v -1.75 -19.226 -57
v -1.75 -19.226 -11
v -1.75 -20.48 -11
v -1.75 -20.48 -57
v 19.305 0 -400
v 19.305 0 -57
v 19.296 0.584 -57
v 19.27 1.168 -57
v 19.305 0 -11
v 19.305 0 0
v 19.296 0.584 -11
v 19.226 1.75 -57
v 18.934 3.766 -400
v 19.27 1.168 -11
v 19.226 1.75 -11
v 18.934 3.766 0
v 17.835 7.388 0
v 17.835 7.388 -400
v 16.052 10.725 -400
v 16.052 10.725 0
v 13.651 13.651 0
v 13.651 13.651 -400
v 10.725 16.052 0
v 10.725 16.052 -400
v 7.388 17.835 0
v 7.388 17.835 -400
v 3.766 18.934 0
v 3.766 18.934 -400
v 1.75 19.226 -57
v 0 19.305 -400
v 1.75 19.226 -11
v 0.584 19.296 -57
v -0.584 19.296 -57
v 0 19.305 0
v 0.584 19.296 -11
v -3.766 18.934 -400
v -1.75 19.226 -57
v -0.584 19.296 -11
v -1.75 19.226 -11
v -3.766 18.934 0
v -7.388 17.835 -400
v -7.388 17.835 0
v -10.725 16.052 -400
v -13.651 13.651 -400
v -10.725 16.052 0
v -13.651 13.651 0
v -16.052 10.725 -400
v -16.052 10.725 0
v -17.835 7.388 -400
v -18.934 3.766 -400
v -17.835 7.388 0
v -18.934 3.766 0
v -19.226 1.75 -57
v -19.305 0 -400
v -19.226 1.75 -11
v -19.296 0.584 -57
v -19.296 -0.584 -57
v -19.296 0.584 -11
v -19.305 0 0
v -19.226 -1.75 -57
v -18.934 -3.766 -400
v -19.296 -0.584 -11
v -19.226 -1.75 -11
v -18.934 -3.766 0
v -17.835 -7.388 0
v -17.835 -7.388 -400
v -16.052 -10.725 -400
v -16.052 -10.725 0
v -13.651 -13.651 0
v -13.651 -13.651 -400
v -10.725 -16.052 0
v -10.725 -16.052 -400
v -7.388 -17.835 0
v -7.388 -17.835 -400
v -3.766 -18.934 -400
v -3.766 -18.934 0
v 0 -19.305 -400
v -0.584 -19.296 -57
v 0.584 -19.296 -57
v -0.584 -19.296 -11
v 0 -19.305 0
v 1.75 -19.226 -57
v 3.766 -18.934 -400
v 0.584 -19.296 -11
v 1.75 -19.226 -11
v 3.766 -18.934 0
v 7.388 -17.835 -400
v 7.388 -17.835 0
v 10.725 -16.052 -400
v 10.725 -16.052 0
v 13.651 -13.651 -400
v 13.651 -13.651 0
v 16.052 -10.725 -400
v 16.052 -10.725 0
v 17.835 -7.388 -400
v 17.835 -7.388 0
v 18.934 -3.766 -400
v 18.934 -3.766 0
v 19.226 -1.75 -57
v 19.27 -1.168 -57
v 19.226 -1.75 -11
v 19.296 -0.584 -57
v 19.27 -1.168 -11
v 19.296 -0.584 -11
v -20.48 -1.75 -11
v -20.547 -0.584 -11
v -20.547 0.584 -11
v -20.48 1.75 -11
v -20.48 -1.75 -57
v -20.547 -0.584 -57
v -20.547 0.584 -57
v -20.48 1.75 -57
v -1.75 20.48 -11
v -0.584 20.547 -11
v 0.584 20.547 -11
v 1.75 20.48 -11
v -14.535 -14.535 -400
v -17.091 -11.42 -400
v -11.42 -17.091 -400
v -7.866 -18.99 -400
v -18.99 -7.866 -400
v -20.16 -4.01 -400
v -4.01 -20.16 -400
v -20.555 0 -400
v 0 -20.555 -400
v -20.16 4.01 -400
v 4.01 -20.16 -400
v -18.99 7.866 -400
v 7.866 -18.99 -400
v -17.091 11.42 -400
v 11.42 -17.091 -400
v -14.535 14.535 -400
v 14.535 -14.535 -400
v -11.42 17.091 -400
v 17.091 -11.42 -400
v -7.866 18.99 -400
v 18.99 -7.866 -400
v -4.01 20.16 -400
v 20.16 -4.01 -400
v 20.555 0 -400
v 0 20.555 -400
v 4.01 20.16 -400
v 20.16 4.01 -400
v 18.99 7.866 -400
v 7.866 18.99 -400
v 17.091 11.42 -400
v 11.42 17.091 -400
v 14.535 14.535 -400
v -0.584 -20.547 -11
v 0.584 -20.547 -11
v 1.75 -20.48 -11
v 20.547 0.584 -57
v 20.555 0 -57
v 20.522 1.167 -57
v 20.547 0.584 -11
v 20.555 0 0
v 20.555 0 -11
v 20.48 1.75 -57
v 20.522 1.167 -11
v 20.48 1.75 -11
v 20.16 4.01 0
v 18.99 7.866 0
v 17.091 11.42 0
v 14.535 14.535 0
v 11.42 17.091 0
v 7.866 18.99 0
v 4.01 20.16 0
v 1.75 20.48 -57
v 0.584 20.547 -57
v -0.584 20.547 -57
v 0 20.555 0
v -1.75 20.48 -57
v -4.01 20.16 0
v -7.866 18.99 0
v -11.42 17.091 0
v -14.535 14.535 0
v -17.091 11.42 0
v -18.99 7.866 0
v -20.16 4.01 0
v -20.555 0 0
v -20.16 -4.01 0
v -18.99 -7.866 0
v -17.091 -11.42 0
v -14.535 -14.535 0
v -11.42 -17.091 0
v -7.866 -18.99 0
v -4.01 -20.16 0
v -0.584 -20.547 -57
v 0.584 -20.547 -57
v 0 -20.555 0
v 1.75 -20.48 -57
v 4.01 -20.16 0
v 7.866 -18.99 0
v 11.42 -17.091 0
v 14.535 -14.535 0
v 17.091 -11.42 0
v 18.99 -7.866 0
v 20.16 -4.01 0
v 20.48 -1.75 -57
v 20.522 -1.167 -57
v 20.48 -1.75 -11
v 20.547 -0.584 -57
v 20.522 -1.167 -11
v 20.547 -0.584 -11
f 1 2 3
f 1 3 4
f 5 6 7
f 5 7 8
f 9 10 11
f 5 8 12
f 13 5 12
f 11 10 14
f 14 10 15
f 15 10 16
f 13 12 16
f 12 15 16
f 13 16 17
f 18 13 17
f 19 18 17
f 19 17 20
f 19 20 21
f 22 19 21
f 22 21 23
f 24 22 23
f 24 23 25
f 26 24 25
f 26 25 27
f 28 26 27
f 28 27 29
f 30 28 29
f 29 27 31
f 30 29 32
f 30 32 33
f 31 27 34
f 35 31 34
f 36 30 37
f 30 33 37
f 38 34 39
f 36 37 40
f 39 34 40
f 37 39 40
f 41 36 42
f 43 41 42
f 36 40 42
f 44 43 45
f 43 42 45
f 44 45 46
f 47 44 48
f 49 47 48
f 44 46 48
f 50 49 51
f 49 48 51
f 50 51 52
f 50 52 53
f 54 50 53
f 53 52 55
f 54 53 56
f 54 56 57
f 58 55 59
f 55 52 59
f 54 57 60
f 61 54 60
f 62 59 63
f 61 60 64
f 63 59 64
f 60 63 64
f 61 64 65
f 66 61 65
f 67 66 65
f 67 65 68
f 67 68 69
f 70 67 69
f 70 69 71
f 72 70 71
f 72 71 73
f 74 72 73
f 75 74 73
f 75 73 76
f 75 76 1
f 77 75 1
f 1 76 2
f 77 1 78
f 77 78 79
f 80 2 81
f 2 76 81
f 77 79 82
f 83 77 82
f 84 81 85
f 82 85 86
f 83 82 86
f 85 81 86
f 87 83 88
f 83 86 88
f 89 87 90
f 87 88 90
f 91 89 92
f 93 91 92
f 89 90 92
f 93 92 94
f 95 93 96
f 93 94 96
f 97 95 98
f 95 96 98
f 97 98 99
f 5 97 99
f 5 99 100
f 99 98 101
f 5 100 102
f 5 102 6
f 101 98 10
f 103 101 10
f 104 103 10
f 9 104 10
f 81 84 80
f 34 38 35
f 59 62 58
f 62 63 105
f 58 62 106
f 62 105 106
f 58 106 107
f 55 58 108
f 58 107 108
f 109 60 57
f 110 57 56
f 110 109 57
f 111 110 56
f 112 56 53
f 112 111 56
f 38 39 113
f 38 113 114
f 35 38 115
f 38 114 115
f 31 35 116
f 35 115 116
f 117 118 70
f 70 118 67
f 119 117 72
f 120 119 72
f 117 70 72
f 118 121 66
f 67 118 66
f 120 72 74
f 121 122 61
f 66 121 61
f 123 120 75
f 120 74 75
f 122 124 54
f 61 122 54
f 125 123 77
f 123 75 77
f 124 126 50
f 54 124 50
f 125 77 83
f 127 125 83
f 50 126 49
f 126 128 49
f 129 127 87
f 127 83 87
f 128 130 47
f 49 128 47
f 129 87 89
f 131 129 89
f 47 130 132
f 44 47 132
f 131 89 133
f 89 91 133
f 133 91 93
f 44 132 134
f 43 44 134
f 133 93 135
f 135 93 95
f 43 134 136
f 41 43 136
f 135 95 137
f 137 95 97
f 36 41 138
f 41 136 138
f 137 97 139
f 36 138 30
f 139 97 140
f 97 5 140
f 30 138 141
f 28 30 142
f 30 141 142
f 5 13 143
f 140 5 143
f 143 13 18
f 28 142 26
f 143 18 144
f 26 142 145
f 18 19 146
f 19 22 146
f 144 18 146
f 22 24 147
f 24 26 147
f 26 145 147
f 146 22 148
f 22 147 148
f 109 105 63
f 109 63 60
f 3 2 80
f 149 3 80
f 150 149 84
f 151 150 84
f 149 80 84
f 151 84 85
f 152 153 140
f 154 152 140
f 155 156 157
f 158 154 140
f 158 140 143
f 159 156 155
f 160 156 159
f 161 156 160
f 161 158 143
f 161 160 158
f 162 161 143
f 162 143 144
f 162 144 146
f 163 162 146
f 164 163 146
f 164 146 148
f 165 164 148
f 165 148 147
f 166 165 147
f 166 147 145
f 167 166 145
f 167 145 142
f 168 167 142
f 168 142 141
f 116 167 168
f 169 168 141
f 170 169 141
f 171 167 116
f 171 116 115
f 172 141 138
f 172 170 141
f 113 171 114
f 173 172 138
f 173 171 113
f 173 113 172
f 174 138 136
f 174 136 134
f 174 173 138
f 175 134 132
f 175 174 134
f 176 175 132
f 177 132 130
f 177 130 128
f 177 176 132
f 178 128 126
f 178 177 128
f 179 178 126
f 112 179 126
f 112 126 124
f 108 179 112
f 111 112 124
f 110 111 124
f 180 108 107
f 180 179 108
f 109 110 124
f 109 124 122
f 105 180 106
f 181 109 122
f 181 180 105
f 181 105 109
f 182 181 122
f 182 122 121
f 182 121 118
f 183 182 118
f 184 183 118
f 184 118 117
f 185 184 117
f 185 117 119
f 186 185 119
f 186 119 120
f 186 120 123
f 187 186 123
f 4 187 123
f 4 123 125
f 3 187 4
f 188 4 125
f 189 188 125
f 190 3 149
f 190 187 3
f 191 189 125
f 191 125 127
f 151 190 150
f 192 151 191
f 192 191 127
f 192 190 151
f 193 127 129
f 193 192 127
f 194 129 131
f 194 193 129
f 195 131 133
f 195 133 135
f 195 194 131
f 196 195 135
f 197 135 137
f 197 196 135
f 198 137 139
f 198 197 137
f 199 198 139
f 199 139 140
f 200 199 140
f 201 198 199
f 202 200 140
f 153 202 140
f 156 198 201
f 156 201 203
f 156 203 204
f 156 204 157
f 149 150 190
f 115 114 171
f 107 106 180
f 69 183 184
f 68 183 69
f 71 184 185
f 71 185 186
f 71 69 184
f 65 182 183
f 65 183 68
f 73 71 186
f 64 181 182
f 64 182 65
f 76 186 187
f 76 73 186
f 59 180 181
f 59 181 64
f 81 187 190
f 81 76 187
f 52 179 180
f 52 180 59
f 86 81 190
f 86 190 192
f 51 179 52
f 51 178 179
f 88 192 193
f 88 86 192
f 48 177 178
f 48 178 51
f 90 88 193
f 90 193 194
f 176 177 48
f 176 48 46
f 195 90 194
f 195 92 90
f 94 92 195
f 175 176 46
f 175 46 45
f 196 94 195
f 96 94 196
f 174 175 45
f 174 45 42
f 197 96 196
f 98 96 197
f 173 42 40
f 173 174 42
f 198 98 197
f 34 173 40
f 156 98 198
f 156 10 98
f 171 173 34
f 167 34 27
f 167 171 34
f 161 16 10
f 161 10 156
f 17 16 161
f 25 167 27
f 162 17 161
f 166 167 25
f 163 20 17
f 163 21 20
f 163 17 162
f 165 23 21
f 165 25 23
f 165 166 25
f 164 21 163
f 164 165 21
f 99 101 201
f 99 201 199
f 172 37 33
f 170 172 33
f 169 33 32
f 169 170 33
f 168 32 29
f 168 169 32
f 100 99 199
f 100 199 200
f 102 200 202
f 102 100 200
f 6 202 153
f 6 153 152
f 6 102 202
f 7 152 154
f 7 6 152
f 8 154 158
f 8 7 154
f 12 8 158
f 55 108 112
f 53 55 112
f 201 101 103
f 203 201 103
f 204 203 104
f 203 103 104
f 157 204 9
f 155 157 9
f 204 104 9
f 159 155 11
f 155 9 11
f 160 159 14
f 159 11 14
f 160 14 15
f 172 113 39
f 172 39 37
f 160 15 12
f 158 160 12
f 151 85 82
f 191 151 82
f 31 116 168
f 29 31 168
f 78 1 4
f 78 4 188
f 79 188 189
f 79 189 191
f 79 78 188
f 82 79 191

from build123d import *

# Parameters (mm, degrees)
SKETCH1_R           = 20.555
SKETCH1_R_2         = 19.305
BOSS_EXTRUDE3_DEPTH = 400
SKETCH2_W           = 3.5
SKETCH2_H           = 46
CUT_EXTRUDE1_DEPTH  = 21.555
CIRPATTERN1_COUNT   = 2
CIRPATTERN1_ANGLE   = 90


with BuildPart() as part:
    # Sketch1 → Boss-Extrude3 (new body)
    with BuildSketch(Plane.XY):
        Circle(SKETCH1_R)
        Circle(SKETCH1_R_2, mode=Mode.SUBTRACT)
    extrude(amount=-BOSS_EXTRUDE3_DEPTH)

    # Sketch2 → Cut-Extrude1 (cut, symmetric)
    with BuildSketch(Plane(origin=(0, 0, 0), x_dir=(1, 0, 0), z_dir=(0, 1, 0))):
        with Locations((0, 34)):
            Rectangle(SKETCH2_W, SKETCH2_H)
    cut_extrude1 = extrude(amount=CUT_EXTRUDE1_DEPTH, both=True, mode=Mode.SUBTRACT)

    # CirPattern1: Cut-Extrude1 ×2 about axis
    cirpattern1_axis = Axis((0, 0, -400), (0, 0, 1))
    for i in range(1, CIRPATTERN1_COUNT):
        add(cut_extrude1.rotate(cirpattern1_axis, i * CIRPATTERN1_ANGLE / (CIRPATTERN1_COUNT - 1)), mode=Mode.SUBTRACT)


solid = part.part
